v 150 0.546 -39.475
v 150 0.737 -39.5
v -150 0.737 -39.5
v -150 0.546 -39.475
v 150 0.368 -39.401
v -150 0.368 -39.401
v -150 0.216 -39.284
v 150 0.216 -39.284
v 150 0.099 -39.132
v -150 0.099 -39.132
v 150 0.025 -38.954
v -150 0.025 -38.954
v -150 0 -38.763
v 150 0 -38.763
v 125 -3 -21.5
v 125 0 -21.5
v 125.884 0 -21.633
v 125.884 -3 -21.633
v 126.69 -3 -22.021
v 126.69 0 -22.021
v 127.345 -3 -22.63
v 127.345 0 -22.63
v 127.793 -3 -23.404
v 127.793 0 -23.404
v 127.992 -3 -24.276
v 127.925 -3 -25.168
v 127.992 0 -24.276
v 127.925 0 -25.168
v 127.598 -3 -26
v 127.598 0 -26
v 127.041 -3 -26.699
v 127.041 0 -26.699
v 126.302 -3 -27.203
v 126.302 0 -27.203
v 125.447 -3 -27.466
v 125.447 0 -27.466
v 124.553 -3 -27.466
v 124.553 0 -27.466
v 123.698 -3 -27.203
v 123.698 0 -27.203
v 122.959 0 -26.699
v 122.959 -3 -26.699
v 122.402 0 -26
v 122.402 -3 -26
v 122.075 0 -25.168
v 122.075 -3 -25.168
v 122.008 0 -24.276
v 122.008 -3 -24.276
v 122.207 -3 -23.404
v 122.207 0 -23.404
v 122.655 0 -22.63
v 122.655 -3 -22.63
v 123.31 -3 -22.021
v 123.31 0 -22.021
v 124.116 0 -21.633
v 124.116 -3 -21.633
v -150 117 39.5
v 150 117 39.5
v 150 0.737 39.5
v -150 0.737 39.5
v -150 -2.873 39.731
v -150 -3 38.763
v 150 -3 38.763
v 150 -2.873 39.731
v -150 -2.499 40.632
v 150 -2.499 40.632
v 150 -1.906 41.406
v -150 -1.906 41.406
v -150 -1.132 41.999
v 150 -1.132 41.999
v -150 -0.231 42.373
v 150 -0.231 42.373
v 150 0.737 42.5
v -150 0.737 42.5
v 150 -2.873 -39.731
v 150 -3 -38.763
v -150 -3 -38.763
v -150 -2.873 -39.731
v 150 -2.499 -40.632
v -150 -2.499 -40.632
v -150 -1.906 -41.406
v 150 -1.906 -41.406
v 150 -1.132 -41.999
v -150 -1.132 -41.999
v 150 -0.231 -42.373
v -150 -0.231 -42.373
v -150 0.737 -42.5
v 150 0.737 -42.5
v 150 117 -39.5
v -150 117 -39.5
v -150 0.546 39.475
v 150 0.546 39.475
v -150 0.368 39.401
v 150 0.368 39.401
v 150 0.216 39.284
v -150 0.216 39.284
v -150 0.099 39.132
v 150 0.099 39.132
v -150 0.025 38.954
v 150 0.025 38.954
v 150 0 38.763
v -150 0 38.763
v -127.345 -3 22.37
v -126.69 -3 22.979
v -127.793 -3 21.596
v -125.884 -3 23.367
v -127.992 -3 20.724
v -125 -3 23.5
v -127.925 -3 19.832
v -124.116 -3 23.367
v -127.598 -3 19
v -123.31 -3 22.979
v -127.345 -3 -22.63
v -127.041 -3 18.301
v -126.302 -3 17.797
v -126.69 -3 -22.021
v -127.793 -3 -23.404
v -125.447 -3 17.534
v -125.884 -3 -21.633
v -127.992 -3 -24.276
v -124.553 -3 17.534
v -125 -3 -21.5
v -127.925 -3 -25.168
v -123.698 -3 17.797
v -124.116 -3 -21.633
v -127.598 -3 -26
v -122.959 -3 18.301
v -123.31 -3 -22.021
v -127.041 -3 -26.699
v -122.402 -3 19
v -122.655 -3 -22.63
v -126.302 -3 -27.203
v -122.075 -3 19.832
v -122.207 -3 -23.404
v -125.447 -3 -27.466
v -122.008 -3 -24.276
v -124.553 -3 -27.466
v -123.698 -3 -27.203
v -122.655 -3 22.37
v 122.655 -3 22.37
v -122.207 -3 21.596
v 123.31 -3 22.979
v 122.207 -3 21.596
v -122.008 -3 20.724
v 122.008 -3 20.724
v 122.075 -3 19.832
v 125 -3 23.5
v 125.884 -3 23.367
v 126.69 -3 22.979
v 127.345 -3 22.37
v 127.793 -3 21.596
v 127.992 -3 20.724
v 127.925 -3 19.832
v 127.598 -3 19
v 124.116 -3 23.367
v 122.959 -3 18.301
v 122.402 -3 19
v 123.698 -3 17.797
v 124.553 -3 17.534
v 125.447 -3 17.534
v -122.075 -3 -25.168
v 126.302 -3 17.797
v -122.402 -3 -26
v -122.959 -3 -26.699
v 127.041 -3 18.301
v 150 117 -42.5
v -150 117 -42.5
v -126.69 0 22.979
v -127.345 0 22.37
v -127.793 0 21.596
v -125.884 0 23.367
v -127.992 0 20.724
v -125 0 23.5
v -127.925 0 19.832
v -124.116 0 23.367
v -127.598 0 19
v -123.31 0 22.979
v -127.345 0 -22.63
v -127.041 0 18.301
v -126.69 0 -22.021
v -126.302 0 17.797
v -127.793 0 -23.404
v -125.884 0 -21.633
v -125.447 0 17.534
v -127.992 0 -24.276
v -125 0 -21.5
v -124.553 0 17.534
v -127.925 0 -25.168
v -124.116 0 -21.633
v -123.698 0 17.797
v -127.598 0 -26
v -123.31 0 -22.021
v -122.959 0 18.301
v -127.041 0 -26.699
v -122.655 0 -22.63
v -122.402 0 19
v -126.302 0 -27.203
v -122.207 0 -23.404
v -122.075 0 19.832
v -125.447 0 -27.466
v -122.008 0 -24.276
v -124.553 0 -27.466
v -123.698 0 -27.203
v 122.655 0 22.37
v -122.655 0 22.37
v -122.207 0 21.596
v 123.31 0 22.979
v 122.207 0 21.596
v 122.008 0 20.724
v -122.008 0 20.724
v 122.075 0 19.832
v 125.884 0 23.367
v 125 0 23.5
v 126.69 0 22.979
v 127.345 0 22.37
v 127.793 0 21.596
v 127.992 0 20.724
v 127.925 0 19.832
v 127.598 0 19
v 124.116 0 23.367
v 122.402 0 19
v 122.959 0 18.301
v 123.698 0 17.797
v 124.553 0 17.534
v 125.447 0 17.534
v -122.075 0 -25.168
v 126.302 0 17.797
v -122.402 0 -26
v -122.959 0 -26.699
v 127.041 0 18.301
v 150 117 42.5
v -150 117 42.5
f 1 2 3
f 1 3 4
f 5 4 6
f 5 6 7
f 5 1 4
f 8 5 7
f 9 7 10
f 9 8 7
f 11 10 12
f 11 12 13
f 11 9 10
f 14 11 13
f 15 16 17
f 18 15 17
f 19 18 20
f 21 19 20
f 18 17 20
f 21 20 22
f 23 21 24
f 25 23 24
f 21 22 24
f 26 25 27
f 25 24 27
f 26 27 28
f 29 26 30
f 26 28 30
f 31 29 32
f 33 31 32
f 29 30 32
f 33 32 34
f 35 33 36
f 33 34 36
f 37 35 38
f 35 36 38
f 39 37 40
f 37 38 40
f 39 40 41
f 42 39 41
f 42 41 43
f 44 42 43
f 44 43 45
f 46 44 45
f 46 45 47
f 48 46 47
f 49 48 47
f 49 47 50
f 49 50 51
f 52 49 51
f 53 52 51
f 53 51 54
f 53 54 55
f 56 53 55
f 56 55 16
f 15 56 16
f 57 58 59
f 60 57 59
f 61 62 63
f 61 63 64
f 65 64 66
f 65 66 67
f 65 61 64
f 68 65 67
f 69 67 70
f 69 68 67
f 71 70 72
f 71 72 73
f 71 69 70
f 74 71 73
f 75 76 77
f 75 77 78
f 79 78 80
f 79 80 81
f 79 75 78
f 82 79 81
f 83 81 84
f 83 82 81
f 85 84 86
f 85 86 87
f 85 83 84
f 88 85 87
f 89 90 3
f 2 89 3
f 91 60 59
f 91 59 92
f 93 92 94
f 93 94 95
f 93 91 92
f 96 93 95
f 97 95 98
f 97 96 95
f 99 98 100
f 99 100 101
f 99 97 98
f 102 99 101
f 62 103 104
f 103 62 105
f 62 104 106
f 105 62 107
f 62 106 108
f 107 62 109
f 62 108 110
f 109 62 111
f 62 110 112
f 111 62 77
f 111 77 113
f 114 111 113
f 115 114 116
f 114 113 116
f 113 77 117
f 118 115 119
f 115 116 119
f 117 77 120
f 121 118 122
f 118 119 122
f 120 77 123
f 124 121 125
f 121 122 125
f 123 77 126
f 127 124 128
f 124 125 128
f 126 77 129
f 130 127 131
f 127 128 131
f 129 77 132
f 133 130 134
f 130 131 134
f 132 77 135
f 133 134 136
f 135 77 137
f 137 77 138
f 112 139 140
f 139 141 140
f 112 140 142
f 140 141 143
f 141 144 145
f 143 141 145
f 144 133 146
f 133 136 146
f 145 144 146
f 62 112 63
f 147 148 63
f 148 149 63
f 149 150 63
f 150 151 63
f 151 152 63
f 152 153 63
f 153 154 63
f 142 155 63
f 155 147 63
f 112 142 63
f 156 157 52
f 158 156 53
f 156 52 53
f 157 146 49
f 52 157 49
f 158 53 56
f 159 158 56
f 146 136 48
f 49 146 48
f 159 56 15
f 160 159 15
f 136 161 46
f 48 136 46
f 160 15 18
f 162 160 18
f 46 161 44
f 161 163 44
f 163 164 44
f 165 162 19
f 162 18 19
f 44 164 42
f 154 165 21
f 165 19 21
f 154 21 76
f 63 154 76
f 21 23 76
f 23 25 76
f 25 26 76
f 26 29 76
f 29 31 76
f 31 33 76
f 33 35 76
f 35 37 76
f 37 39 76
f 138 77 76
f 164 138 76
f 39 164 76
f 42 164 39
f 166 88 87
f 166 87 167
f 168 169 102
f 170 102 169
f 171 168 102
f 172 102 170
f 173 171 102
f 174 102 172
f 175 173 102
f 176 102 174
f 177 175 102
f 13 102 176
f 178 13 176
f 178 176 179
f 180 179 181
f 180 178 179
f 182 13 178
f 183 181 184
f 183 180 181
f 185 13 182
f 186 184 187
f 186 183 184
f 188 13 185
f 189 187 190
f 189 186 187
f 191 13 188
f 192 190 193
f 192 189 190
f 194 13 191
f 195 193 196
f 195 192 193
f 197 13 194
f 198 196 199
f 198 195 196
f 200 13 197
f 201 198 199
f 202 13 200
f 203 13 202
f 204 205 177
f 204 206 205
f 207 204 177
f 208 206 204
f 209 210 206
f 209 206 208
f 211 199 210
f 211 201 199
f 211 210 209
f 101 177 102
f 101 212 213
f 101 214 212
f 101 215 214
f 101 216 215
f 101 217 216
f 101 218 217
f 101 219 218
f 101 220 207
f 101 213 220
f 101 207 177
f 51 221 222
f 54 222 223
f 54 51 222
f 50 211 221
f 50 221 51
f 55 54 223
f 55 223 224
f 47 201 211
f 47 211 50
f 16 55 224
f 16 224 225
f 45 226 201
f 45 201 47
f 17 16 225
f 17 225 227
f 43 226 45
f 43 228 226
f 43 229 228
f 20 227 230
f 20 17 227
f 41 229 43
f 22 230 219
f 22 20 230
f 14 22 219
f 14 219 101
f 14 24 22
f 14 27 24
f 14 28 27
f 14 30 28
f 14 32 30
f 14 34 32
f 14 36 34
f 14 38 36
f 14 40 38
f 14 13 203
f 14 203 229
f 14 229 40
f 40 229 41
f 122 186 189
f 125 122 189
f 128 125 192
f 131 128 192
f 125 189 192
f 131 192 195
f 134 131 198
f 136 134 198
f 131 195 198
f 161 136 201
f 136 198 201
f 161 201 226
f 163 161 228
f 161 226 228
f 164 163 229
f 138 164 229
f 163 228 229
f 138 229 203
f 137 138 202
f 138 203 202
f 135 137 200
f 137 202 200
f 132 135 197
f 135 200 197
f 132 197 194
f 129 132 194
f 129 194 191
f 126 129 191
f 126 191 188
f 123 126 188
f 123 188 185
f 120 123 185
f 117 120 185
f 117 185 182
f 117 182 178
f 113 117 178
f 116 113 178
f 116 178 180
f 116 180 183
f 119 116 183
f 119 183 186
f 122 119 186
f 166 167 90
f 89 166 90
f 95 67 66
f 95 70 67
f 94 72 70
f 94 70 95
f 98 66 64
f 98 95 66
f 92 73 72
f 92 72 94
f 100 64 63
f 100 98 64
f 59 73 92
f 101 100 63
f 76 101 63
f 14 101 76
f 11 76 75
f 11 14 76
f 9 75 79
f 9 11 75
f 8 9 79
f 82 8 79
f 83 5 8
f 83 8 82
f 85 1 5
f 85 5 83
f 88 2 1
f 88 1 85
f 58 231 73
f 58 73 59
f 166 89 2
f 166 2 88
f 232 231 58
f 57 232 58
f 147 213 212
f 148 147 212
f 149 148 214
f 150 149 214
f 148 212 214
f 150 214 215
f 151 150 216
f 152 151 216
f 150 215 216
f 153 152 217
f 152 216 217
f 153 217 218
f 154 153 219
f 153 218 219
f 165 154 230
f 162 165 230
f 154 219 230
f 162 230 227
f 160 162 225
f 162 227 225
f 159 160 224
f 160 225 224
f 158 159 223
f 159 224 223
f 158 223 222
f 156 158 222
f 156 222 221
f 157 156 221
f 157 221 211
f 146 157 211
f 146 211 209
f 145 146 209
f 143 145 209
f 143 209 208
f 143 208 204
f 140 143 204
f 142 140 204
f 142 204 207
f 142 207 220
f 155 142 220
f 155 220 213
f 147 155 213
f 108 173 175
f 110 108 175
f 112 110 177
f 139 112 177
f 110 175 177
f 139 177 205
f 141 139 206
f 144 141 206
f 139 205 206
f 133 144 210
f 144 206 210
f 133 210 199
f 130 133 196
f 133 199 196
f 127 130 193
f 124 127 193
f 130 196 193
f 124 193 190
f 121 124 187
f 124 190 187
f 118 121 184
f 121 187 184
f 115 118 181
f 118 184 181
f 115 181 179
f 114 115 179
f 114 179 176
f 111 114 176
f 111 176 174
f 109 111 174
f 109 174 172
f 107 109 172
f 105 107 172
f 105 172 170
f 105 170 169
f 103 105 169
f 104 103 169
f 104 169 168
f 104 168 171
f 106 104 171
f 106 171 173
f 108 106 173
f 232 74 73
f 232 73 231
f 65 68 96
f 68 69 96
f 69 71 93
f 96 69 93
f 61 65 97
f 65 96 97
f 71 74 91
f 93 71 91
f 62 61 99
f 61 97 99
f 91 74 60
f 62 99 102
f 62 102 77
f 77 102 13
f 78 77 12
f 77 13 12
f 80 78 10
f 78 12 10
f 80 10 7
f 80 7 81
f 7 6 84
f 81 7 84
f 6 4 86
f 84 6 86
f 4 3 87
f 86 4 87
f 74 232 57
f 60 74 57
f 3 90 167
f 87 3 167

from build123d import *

# Parameters (mm, degrees)
SKETCH1_W                      = 300
SKETCH1_H                      = 85
BASE_FLANGE2_DEPTH             = 3
EDGE_FLANGE1_STRIP_W           = 13.4732
EDGE_FLANGE1_STRIP_H           = 3
EDGE_FLANGE1_STRIP_CUT_DEPTH   = 300
EDGE_FLANGE1_STRIP_2_W         = 13.4732
EDGE_FLANGE1_STRIP_2_H         = 3
EDGE_FLANGE1_STRIP_CUT_2_DEPTH = 300
EDGE_FLANGE1_DEPTH             = 300
EDGE_FLANGE1_BEND_DEPTH        = 300
SKETCH17_R                     = 3
CUT_EXTRUDE1_DEPTH             = 10


# Sheet-metal steps are written as plain solids
with BuildPart() as part:
    # Sketch1 → Base-Flange2 (new body)
    with BuildSketch(Plane(origin=(0, 0, 0), x_dir=(1, 0, 0), z_dir=(0, 1, 0))):
        Rectangle(SKETCH1_W, SKETCH1_H)
    extrude(amount=-BASE_FLANGE2_DEPTH)

    # Edge-Flange1 strip (across the edge) → Edge-Flange1 strip cut (cut)
    with BuildSketch(Plane(origin=(-150, 0, 42.5), x_dir=(0, 0, -1), z_dir=(1, 0, 0))):
        with Locations((-3, -1.5)):
            Rectangle(EDGE_FLANGE1_STRIP_W, EDGE_FLANGE1_STRIP_H)
    extrude(amount=EDGE_FLANGE1_STRIP_CUT_DEPTH, mode=Mode.SUBTRACT)

    # Edge-Flange1 strip 2 (across the edge) → Edge-Flange1 strip cut 2 (cut)
    with BuildSketch(Plane(origin=(150, 0, -42.5), x_dir=(0, 0, 1), z_dir=(-1, 0, 0))):
        with Locations((-3, -1.5)):
            Rectangle(EDGE_FLANGE1_STRIP_2_W, EDGE_FLANGE1_STRIP_2_H)
    extrude(amount=EDGE_FLANGE1_STRIP_CUT_2_DEPTH, mode=Mode.SUBTRACT)

    # Edge-Flange1 section (across the edge) → Edge-Flange1 (add)
    with BuildSketch(Plane(origin=(-150, 0, 42.5), x_dir=(0, 0, -1), z_dir=(1, 0, 0))):
        with BuildLine():
            Line((0, 0.7366), (0, 117))
            Line((0, 117), (3, 117))
            Line((3, 117), (3, 0.7366))
            ThreePointArc((3, 0.7366), (3.215745145, 0.215745145), (3.7366, 0))
            Line((3.7366, 0), (3.7366, -3))
            ThreePointArc((3.7366, -3), (1.094424801, -1.905575199), (0, 0.7366))
        make_face()
    extrude(amount=EDGE_FLANGE1_DEPTH)

    # Edge-Flange1 section 2 (across the edge) → Edge-Flange1 bend (add)
    with BuildSketch(Plane(origin=(150, 0, -42.5), x_dir=(0, 0, 1), z_dir=(-1, 0, 0))):
        with BuildLine():
            Line((0, 0.7366), (0, 117))
            Line((0, 117), (3, 117))
            Line((3, 117), (3, 0.7366))
            ThreePointArc((3, 0.7366), (3.215745145, 0.215745145), (3.7366, 0))
            Line((3.7366, 0), (3.7366, -3))
            ThreePointArc((3.7366, -3), (1.094424801, -1.905575199), (0, 0.7366))
        make_face()
    extrude(amount=EDGE_FLANGE1_BEND_DEPTH)

    # Sketch17 → Cut-Extrude1 (cut)
    with BuildSketch(Plane(origin=(0, 0, 0), x_dir=(1, 0, 0), z_dir=(0, 1, 0))):
        with Locations(Location((-125, 24.5, 0), (0, 0, 270))):
            Circle(SKETCH17_R)
        with Locations(Location((-125, -20.5, 0), (0, 0, 270))):
            Circle(SKETCH17_R)
        with Locations(Location((125, 24.5, 0), (0, 0, 270))):
            Circle(SKETCH17_R)
        with Locations(Location((125, -20.5, 0), (0, 0, 270))):
            Circle(SKETCH17_R)
    extrude(amount=-CUT_EXTRUDE1_DEPTH, mode=Mode.SUBTRACT)


solid = part.part
